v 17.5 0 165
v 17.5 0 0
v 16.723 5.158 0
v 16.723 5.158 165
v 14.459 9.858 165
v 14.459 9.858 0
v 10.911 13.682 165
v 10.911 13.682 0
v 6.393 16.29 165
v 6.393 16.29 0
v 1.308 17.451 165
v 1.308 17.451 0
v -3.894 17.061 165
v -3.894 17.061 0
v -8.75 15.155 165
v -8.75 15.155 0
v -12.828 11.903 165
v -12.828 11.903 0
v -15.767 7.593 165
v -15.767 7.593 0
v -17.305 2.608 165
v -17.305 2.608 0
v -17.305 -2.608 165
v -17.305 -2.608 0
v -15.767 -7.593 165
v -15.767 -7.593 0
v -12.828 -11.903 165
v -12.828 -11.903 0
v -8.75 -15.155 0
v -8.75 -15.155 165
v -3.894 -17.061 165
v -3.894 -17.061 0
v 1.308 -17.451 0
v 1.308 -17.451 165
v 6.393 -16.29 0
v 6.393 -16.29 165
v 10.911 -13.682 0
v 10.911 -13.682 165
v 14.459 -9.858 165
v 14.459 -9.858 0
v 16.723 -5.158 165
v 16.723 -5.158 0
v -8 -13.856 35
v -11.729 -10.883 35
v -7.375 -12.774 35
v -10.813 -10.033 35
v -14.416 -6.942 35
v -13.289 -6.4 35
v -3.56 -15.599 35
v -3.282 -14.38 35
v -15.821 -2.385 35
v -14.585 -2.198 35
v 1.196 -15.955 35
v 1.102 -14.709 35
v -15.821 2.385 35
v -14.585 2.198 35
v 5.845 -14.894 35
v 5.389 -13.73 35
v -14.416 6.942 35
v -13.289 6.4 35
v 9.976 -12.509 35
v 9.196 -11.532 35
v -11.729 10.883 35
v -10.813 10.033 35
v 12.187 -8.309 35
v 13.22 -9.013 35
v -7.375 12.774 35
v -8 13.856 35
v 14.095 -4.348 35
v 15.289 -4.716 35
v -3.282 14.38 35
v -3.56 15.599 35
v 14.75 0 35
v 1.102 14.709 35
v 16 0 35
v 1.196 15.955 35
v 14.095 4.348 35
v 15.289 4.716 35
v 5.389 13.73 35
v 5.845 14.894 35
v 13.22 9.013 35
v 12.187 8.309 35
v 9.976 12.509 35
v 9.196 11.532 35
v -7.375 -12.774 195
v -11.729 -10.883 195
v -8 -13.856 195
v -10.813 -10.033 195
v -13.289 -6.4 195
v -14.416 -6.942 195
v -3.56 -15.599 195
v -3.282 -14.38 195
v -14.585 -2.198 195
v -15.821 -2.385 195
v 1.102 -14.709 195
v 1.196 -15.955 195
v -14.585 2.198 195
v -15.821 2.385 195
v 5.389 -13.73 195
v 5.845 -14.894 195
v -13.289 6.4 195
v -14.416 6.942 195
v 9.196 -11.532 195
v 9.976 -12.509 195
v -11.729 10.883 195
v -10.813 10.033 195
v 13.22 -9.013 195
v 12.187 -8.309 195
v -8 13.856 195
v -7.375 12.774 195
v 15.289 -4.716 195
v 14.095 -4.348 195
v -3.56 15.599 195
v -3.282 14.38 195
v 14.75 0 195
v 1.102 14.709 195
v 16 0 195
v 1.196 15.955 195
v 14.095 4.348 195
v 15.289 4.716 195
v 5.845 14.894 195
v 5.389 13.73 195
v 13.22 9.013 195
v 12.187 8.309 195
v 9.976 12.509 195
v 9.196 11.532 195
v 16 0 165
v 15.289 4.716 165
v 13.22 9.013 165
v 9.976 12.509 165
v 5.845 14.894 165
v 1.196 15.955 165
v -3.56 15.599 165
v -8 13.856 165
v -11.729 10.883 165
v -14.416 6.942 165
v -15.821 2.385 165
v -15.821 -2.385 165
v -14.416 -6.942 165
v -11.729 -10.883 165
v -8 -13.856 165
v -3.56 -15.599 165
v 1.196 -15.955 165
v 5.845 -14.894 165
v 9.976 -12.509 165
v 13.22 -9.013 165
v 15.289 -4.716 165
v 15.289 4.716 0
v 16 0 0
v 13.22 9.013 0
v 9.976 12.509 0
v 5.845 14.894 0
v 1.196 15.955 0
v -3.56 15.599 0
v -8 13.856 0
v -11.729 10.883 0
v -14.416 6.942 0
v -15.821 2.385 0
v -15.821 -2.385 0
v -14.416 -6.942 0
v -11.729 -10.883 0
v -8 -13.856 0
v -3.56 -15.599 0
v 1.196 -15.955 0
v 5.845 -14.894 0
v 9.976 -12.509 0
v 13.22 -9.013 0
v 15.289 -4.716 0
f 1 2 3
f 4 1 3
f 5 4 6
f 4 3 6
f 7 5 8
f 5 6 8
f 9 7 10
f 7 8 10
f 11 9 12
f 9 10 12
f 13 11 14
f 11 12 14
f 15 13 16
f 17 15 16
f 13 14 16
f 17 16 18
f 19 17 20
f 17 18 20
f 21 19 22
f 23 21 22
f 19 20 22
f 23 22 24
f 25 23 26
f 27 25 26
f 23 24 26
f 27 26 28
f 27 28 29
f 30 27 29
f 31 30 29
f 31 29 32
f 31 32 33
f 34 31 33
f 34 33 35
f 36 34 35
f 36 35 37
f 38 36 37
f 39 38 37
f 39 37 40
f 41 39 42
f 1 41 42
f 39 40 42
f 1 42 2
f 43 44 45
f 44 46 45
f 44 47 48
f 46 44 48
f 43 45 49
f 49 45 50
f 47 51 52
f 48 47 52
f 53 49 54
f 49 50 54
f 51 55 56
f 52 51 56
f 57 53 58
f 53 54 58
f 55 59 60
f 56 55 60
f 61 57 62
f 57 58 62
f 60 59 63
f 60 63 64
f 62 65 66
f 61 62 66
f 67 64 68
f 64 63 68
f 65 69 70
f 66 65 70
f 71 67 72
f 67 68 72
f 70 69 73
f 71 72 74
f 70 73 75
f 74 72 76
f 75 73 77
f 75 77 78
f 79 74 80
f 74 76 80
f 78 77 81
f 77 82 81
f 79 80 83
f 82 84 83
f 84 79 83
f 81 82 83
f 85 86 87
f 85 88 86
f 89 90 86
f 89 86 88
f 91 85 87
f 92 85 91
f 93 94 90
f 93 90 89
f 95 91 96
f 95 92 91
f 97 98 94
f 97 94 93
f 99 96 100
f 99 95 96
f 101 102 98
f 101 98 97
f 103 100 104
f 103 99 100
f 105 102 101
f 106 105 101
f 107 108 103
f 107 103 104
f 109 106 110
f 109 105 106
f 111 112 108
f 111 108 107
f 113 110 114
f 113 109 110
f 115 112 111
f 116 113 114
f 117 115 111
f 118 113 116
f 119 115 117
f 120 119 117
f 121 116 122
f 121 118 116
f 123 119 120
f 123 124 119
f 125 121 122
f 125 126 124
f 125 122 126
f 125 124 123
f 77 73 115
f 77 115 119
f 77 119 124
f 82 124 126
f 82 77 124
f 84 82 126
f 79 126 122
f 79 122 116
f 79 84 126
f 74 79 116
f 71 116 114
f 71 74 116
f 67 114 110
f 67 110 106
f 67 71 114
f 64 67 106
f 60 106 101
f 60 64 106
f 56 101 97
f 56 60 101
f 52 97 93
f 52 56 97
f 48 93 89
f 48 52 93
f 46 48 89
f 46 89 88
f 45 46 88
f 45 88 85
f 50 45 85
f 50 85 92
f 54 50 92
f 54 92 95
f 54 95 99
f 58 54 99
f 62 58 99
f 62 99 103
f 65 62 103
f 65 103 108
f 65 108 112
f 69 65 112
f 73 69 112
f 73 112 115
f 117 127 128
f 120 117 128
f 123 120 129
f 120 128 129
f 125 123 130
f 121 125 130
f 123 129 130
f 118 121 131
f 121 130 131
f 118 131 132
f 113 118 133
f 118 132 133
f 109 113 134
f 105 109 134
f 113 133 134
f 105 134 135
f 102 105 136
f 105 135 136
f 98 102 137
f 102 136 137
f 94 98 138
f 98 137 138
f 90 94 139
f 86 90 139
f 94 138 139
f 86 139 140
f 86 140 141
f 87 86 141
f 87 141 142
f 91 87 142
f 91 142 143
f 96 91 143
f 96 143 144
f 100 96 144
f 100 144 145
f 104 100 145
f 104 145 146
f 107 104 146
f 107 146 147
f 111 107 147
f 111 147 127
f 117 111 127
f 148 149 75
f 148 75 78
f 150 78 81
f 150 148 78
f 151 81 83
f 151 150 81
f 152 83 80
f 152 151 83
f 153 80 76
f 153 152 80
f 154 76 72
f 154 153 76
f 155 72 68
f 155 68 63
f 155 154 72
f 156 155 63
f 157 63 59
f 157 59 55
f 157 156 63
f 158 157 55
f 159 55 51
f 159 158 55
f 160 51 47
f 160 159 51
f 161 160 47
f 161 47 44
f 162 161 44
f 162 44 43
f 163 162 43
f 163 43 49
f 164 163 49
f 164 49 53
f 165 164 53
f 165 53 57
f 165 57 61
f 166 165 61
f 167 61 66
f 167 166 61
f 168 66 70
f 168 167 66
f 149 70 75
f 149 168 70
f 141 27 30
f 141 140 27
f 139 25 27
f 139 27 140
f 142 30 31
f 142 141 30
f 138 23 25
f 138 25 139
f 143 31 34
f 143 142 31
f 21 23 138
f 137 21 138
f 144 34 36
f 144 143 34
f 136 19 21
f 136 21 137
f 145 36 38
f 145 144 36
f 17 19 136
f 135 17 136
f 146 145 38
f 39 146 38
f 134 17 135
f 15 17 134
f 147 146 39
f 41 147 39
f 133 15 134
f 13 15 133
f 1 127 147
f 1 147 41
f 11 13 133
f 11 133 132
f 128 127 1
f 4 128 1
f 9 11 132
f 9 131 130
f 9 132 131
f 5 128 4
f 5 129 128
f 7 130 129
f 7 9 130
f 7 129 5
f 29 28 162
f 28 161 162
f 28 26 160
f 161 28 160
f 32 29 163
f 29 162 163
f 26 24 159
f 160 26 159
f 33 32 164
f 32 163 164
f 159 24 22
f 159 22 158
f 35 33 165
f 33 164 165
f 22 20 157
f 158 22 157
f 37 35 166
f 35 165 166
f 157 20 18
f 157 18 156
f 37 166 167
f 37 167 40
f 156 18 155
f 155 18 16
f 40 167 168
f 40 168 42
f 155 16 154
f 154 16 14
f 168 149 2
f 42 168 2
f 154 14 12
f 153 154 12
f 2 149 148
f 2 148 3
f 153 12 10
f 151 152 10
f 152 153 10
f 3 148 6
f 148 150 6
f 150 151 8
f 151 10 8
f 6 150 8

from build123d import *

# Parameters (mm, degrees)
F0_R     = 16
F0_R_2   = 14.75
F1_DEPTH = 195
F0_R_3   = 17.5
F2_DEPTH = 165
F3_DEPTH = 35


with BuildPart() as f1:
    # F0 (on Top) → F1 (new body)
    with BuildSketch(Plane.XY):
        Circle(F0_R)
        Circle(F0_R_2, mode=Mode.SUBTRACT)
    extrude(amount=F1_DEPTH)

    # F0 (on Top) → F2 (join)
    with BuildSketch(Plane.XY):
        Circle(F0_R_3)
        Circle(F0_R, mode=Mode.SUBTRACT)
    extrude(amount=F2_DEPTH)

    # F0 (on Top) → F3 (cut)
    with BuildSketch(Plane.XY):
        Circle(F0_R)
        Circle(F0_R_2, mode=Mode.SUBTRACT)
    extrude(amount=F3_DEPTH, mode=Mode.SUBTRACT)


solid = f1.part
